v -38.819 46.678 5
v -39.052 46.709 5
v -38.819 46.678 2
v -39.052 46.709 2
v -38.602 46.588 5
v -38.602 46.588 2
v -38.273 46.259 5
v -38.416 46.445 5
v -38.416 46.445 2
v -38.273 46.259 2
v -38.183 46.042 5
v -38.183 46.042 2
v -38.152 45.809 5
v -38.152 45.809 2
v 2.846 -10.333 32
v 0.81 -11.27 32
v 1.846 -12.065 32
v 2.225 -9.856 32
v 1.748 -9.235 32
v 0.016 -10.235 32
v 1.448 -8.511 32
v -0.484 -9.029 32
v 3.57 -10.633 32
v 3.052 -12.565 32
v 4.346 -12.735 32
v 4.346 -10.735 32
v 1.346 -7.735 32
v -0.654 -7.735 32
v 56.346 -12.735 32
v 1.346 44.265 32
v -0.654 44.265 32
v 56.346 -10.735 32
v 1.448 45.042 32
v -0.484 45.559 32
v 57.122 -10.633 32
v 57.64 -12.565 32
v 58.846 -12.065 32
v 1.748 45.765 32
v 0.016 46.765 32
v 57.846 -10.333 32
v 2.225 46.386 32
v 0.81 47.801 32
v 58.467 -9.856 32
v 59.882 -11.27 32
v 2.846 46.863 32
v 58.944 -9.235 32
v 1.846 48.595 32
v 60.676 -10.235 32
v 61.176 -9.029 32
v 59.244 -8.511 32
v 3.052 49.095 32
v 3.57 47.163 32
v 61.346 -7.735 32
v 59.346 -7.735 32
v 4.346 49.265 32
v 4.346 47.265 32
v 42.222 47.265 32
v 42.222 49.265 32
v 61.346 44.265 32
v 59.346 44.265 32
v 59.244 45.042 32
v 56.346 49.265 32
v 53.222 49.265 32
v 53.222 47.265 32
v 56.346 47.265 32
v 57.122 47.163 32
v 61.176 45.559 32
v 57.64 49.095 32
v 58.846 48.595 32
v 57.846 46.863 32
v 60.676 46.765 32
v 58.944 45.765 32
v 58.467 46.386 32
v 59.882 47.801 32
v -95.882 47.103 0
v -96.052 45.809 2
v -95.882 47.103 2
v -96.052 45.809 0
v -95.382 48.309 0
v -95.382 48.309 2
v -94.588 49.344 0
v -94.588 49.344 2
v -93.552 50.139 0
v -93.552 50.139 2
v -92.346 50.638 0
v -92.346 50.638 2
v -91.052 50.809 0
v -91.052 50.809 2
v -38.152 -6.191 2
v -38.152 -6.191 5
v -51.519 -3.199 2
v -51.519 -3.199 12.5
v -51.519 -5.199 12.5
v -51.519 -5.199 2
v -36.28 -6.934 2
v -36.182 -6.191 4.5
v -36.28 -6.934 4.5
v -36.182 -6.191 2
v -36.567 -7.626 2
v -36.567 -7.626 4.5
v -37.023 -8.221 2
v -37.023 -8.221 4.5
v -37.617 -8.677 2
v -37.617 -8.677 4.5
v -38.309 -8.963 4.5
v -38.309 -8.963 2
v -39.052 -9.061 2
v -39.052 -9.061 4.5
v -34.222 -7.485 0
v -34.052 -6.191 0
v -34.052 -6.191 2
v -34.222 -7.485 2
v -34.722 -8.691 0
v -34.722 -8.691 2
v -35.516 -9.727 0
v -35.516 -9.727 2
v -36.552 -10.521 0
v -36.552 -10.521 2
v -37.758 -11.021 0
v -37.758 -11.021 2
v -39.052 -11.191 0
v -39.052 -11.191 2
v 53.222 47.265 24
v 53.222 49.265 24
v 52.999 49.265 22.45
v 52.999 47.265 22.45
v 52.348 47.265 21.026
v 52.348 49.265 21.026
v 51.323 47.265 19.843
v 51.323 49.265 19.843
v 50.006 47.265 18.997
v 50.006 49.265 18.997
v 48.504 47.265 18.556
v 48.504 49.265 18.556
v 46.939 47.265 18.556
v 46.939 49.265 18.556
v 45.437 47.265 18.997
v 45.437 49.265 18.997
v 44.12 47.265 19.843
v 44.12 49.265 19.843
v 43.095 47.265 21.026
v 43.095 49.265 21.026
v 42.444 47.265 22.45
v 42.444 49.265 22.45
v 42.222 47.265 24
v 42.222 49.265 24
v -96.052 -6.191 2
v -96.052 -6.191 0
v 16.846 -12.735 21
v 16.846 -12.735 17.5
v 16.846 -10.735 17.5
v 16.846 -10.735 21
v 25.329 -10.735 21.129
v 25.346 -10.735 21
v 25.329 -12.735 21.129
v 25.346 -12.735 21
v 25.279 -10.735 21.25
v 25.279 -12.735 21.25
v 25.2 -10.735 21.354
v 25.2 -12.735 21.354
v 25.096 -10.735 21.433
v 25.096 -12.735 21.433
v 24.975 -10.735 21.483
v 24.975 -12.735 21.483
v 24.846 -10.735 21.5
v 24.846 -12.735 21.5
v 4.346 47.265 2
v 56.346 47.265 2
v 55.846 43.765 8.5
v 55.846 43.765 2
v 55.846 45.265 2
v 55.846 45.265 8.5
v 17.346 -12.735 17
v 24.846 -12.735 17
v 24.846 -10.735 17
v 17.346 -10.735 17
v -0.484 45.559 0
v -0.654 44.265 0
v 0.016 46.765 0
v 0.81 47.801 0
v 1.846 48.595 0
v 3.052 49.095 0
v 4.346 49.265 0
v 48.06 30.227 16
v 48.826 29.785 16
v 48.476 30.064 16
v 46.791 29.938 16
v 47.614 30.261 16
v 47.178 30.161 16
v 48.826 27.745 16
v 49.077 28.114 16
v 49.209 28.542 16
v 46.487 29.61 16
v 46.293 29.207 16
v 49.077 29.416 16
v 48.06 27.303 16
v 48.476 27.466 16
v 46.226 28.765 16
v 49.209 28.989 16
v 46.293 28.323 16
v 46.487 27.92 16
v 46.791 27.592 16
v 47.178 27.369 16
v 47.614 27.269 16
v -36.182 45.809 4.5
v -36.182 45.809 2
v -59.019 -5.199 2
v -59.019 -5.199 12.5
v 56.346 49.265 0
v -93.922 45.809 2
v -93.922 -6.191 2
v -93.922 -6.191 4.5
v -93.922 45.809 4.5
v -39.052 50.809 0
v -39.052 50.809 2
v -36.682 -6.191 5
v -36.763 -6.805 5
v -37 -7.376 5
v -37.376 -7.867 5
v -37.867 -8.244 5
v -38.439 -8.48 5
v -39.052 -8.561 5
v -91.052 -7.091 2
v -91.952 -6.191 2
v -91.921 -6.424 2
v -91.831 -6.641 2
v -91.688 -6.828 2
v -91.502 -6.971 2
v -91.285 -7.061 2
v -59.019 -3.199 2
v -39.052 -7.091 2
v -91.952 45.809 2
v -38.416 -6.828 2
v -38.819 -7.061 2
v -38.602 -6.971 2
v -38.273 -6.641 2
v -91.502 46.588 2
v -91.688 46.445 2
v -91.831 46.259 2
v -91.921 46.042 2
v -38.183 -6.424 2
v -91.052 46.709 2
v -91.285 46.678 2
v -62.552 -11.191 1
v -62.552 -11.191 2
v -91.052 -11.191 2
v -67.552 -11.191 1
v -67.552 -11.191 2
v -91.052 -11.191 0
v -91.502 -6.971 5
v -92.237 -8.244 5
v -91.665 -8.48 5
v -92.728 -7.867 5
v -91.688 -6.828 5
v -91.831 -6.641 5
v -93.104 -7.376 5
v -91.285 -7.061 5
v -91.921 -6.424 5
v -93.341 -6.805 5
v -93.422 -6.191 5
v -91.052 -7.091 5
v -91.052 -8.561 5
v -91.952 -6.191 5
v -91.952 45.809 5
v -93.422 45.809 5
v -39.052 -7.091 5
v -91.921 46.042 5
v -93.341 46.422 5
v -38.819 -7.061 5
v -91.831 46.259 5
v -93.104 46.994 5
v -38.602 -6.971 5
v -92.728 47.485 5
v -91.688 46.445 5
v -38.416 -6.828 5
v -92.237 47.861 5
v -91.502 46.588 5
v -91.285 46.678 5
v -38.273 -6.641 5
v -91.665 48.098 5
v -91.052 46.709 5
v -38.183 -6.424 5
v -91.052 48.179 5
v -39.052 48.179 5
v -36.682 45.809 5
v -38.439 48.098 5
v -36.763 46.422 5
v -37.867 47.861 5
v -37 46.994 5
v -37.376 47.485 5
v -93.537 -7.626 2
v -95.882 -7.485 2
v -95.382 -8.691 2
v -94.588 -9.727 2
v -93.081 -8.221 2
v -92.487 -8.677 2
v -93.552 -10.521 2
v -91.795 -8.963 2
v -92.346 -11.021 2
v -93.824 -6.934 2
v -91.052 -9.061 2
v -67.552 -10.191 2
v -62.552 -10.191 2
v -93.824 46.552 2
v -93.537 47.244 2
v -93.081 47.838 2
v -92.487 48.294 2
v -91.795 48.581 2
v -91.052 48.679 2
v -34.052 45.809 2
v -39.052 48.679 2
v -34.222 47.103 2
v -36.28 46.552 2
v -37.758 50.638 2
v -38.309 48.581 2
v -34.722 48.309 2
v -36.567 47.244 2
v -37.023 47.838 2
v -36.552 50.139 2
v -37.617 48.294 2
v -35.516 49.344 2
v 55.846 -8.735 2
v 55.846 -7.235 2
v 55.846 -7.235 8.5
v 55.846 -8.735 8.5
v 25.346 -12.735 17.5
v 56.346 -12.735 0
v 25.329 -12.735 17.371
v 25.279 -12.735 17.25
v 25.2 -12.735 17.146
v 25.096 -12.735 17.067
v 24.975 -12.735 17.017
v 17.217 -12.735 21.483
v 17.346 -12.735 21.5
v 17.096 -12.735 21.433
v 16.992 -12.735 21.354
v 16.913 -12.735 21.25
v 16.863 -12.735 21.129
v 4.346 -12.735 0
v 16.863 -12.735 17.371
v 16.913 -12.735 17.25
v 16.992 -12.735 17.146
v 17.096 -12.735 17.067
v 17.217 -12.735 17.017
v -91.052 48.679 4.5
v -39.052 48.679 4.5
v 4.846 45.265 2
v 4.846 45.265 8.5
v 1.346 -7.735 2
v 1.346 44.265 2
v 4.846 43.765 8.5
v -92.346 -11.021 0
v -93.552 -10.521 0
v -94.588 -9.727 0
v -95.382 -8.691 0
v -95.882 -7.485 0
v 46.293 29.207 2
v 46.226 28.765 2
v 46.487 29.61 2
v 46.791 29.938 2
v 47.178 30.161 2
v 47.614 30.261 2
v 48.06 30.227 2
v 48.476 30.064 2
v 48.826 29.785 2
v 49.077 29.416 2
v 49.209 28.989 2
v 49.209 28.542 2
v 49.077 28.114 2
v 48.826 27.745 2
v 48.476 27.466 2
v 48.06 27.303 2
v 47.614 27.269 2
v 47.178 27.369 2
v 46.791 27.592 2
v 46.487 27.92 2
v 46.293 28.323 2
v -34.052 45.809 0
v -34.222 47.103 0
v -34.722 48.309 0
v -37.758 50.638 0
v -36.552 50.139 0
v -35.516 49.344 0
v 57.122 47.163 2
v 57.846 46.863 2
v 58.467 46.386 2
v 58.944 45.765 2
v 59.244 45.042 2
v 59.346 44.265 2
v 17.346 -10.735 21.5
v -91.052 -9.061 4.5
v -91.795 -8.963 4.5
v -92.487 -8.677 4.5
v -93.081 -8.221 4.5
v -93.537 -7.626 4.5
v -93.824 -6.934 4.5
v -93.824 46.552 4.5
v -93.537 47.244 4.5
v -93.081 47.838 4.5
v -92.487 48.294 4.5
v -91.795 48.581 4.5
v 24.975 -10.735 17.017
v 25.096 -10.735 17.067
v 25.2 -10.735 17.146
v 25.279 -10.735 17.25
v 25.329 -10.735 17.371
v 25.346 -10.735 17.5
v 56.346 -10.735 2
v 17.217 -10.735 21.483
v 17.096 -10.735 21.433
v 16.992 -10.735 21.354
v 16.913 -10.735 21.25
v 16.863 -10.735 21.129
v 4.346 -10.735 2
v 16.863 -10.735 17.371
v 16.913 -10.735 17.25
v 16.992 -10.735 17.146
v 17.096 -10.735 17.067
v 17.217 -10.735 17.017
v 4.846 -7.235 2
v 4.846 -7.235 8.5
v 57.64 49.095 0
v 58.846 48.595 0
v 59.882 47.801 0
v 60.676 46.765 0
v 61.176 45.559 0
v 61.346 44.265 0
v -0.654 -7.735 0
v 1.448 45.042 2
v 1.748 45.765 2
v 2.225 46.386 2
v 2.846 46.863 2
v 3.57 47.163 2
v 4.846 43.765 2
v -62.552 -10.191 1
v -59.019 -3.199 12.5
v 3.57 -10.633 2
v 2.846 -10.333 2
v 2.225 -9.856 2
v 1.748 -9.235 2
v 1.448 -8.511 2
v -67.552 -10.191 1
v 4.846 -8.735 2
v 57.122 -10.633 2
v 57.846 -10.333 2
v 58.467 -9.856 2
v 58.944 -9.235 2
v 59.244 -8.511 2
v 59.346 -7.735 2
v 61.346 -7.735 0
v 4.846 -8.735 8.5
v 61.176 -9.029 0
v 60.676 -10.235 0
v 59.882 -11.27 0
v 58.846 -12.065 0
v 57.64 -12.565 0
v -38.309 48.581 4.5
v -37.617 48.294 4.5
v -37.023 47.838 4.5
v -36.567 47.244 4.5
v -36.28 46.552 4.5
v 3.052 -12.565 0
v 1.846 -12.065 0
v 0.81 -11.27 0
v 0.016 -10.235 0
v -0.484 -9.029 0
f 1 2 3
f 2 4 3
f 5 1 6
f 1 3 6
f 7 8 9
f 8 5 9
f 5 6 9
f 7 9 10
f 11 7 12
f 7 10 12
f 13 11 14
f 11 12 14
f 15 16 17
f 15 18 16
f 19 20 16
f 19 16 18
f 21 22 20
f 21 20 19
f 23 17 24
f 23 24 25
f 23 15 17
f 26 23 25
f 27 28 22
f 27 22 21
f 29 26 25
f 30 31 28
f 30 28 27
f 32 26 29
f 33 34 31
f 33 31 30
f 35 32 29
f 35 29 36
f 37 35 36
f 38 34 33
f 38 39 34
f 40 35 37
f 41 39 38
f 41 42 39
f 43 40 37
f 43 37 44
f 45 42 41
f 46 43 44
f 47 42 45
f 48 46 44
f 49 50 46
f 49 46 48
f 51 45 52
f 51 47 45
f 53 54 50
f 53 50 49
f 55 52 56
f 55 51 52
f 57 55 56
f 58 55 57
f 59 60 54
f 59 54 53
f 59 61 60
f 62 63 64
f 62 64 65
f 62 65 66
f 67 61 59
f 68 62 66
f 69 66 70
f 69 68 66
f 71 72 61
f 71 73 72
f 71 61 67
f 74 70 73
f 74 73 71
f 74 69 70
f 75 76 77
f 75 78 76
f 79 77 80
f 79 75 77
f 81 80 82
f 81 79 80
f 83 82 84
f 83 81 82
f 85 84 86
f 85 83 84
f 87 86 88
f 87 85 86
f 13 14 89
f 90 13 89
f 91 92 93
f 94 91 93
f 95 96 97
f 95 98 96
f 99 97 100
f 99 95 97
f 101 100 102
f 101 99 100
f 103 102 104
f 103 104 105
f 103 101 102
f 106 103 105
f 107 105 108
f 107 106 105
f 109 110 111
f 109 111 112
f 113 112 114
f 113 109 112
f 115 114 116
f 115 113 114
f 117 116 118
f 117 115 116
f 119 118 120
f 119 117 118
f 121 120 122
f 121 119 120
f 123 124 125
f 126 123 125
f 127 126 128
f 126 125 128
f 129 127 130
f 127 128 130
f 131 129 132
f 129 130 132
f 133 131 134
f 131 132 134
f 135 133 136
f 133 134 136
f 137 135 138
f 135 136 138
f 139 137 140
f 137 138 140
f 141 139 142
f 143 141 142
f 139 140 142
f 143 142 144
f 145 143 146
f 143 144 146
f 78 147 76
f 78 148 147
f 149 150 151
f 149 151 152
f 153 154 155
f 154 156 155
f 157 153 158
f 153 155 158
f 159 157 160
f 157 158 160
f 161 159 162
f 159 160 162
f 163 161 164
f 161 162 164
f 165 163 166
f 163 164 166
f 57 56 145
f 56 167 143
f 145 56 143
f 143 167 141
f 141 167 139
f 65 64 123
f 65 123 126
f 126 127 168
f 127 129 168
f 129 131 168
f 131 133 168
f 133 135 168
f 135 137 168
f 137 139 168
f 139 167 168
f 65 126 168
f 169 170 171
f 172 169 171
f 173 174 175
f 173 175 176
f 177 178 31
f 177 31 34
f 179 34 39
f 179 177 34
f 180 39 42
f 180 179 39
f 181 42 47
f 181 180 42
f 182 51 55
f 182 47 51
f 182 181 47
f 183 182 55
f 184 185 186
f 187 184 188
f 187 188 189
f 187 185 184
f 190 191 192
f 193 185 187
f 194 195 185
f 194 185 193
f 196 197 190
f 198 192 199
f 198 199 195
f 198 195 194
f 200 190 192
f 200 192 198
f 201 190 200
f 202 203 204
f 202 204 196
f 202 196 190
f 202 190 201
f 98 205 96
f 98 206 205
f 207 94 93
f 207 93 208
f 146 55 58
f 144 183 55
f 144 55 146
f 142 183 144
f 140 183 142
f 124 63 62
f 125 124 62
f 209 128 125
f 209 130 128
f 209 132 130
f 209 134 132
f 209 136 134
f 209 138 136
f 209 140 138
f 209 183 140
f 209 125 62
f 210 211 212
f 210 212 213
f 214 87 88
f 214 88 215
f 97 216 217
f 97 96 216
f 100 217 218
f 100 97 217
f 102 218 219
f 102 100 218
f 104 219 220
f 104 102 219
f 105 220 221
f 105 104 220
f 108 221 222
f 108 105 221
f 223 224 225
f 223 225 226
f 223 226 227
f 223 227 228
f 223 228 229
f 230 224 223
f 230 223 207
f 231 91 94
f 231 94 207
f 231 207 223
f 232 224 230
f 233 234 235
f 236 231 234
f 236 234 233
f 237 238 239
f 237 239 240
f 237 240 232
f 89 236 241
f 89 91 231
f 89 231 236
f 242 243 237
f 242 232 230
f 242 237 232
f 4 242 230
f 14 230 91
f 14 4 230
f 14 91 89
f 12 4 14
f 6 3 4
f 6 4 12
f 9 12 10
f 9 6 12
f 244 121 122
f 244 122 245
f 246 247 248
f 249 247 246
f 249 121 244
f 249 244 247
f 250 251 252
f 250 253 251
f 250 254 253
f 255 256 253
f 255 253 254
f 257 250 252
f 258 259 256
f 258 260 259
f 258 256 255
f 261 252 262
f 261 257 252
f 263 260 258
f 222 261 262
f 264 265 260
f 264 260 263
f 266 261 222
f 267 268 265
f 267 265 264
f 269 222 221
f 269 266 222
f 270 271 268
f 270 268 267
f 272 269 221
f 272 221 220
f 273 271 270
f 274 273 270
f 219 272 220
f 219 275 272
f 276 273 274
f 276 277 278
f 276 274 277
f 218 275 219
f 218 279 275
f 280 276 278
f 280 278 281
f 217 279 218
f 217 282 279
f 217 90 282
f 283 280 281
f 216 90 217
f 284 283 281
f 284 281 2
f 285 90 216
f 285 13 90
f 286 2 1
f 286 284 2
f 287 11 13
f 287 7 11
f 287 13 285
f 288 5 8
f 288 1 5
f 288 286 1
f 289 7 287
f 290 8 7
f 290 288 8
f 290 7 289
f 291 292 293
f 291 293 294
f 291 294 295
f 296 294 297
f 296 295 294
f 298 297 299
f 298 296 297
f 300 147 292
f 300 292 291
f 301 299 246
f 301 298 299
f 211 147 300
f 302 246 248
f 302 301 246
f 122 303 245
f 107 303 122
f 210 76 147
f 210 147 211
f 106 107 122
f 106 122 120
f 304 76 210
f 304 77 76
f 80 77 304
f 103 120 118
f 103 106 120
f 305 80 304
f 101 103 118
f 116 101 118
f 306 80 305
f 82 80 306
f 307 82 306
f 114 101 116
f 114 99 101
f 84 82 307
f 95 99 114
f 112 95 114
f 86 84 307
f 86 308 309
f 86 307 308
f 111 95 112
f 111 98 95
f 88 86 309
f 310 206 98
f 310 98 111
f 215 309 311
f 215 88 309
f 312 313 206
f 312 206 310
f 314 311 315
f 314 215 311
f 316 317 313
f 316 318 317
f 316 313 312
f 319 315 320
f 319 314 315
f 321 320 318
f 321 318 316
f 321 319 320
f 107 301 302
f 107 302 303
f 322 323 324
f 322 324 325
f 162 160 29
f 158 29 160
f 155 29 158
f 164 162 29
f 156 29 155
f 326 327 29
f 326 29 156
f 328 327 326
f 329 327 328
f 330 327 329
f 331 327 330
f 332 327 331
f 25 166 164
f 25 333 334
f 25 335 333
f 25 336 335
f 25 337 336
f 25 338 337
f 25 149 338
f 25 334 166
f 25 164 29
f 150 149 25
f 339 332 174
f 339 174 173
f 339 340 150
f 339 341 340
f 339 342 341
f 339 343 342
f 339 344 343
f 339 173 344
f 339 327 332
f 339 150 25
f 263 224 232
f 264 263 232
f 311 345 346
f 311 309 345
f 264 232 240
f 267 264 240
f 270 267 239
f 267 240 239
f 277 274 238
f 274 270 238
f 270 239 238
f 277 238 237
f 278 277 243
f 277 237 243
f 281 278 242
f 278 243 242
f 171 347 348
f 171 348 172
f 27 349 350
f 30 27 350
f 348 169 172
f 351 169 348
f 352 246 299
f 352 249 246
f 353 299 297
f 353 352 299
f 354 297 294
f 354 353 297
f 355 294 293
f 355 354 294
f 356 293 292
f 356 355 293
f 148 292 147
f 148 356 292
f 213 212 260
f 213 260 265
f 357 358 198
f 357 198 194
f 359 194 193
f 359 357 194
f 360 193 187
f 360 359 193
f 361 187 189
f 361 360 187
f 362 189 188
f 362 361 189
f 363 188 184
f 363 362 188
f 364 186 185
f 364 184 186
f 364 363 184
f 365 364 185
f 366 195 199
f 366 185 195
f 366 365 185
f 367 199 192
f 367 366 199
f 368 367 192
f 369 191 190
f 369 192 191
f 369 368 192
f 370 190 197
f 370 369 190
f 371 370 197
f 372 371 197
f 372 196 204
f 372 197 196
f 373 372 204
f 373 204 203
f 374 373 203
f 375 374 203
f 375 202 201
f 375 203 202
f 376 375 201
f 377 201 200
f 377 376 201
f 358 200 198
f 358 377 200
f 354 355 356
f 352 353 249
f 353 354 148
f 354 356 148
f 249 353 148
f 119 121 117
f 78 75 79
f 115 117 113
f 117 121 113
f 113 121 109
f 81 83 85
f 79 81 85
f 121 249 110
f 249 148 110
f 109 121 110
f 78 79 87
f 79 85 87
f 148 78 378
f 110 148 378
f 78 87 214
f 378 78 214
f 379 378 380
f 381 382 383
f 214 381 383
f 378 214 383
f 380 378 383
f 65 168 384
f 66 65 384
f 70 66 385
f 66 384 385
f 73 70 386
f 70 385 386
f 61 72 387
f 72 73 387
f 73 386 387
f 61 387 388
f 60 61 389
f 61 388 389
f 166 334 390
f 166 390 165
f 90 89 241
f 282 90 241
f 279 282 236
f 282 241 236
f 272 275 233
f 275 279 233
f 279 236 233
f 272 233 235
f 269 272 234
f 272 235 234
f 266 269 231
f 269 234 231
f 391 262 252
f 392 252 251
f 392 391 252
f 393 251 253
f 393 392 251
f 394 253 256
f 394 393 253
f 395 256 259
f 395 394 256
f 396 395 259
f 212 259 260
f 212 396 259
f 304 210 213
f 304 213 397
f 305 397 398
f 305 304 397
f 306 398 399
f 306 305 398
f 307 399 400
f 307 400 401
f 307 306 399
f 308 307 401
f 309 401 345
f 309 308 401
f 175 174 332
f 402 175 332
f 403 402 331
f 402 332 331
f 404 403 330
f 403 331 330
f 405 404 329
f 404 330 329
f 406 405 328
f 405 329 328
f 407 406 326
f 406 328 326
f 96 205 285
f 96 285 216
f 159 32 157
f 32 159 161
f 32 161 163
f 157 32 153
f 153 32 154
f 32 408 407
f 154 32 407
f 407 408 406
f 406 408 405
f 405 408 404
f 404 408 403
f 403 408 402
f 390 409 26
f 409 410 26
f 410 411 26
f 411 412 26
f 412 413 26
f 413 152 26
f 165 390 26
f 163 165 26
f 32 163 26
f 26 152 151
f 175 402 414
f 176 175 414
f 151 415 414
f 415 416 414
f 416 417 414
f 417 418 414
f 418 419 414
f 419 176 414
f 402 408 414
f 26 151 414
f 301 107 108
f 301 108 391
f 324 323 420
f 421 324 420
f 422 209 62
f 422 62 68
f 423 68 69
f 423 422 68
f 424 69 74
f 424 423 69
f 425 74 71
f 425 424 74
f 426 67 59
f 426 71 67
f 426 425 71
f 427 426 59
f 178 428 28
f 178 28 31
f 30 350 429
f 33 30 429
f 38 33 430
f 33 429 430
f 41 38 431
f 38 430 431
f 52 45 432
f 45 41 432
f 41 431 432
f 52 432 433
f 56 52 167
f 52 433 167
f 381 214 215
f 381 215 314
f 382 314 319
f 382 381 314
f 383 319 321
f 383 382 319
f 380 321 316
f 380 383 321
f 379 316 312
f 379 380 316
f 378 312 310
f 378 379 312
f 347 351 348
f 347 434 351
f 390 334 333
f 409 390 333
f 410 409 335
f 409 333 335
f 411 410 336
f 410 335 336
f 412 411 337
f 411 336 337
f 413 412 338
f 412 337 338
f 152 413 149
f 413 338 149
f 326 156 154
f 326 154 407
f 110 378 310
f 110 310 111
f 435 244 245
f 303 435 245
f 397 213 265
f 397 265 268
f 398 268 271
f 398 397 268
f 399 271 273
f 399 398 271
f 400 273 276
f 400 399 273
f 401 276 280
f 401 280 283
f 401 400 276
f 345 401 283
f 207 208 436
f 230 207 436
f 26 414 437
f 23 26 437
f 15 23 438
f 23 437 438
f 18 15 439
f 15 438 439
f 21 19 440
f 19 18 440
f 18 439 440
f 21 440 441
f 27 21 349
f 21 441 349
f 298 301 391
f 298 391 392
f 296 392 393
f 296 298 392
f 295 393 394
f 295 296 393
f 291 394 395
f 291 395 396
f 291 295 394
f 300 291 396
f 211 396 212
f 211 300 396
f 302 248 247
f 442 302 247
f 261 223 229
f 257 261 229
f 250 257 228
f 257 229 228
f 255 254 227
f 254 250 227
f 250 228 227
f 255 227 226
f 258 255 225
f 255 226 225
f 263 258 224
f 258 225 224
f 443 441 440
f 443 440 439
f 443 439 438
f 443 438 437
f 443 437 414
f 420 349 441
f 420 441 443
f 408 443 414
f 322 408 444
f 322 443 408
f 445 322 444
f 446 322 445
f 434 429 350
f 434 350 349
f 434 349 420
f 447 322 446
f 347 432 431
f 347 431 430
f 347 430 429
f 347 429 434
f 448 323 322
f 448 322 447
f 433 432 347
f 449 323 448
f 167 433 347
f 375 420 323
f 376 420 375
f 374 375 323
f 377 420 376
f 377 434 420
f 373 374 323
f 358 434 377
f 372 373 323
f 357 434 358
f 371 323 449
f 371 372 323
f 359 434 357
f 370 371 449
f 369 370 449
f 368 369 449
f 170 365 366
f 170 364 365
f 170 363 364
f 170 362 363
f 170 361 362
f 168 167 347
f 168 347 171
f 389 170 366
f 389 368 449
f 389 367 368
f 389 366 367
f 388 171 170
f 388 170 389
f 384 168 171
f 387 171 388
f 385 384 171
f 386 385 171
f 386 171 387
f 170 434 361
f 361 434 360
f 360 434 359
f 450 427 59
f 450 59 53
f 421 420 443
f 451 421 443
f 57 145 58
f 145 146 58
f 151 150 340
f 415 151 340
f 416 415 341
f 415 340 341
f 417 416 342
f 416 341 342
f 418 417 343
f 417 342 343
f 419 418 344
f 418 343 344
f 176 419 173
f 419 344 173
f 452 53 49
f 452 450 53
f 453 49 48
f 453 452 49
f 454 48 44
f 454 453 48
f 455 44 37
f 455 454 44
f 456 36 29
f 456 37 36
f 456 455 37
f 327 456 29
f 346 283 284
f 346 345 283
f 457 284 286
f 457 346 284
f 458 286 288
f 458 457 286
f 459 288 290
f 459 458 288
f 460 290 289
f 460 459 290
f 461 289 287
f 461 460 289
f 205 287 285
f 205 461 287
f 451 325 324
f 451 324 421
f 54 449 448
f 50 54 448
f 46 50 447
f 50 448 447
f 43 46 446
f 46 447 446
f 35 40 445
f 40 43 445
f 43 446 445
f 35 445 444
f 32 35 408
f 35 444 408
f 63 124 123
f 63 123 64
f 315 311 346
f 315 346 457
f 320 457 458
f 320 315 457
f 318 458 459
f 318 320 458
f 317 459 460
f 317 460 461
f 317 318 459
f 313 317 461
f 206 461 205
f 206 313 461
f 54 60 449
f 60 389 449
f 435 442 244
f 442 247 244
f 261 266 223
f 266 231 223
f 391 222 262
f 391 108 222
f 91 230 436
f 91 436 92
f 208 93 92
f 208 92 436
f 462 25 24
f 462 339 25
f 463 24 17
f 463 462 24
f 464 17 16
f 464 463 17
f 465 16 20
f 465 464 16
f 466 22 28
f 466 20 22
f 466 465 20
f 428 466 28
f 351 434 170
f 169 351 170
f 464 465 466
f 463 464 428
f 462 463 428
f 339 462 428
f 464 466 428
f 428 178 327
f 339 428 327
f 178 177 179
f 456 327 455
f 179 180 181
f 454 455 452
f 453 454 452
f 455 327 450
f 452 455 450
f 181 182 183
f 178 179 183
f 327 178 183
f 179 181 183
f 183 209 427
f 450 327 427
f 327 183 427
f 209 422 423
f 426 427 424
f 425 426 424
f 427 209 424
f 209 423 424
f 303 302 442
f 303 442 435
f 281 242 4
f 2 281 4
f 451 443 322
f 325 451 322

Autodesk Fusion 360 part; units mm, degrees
sketch "Skizze1" plane through (0, 0, 0) normal (0, 0, 1) x (1, 0, 0)
  line L0 (4.346, 49.2651) -> (56.346, 49.2651)
  line L1 (61.346, 44.2651) -> (61.346, -7.7349)
  line L2 (56.346, -12.7349) -> (4.346, -12.7349)
  line L3 (-0.654, -7.7349) -> (-0.654, 44.2651)
  arc A0 (4.346, 49.2651) -> (-0.654, 44.2651) centre (4.346, 44.2651) ccw
  arc A1 (61.346, 44.2651) -> (56.346, 49.2651) centre (56.346, 44.2651) ccw
  arc A2 (56.346, -12.7349) -> (61.346, -7.7349) centre (56.346, -7.7349) ccw
  arc A3 (-0.654, -7.7349) -> (4.346, -12.7349) centre (4.346, -7.7349) ccw
  arc A4 (59.346, 44.2651) -> (56.346, 47.2651) centre (56.346, 44.2651) ccw
  line L4 (4.346, 47.2651) -> (56.346, 47.2651)
  arc A5 (4.346, 47.2651) -> (1.346, 44.2651) centre (4.346, 44.2651) ccw
  line L5 (1.346, -7.7349) -> (1.346, 44.2651)
  arc A6 (1.346, -7.7349) -> (4.346, -10.7349) centre (4.346, -7.7349) ccw
  line L6 (56.346, -10.7349) -> (4.346, -10.7349)
  arc A7 (56.346, -10.7349) -> (59.346, -7.7349) centre (56.346, -7.7349) ccw
  line L7 (59.346, 44.2651) -> (59.346, -7.7349)
  point P0 (-0.654, 49.2651)
  point P1 (61.346, 49.2651)
  point P2 (-0.654, -12.7349)
  dimension "d1" = 62
  dimension "d2" = 62
  dimension "d3" = 5
  dimension "d4" = 5
  dimension "d5" = 2
extrude "Extrusion1" add sketch "Skizze1" along normal blind 2 contours A4 L4 A5 L5 A6 L6 A7 L7 makes body 1
extrude "Extrusion2" add sketch "Skizze1" along normal blind 32 bodies 1
sketch "Skizze2" plane through (0, 0, 2) normal (0, 0, 1) x (-1, 0, 0)
  arc A0 (-4.346, -47.2651) -> (-1.346, -44.2651) centre (-4.346, -44.2651) ccw
  line L0 (-1.346, -44.2651) -> (-1.346, 7.7349)
  arc A1 (-1.346, 7.7349) -> (-4.346, 10.7349) centre (-4.346, 7.7349) ccw
  line L1 (-4.346, 10.7349) -> (-56.346, 10.7349)
  arc A2 (-56.346, 10.7349) -> (-59.346, 7.7349) centre (-56.346, 7.7349) ccw
  line L2 (-59.346, 7.7349) -> (-59.346, -44.2651)
  arc A3 (-59.346, -44.2651) -> (-56.346, -47.2651) centre (-56.346, -44.2651) ccw
  line L3 (-56.346, -47.2651) -> (-4.346, -47.2651)
  line L4 (-30.346, -44.2651) -> (-30.346, 7.7349) construction
  line L5 (-55.846, 7.2349) -> (-4.846, 7.2349)
  line L6 (-4.846, -43.7651) -> (-55.846, -43.7651)
  line L7 (-55.846, 7.2349) -> (-4.846, -43.7651) construction
  line L8 (-4.846, 7.2349) -> (-55.846, -43.7651) construction
  line L9 (-47.726, -43.7651) -> (-47.726, 7.2349) construction
  line L10 (-4.846, -28.7651) -> (-55.846, -28.7651) construction
  circle A4 centre (-47.726, -28.7651) radius 1.5
  line L11 (-13.846, 7.2349) -> (-13.846, -43.7651) construction
  line L12 (-22.846, 7.2349) -> (-22.846, -43.7651) construction
  line L13 (-55.846, -43.7651) -> (-55.846, -45.2651)
  line L14 (-4.846, -43.7651) -> (-4.846, -45.2651)
  line L15 (-4.846, -45.2651) -> (-55.846, -45.2651)
  line L16 (-4.846, 7.2349) -> (-4.846, 8.7349)
  line L17 (-55.846, 7.2349) -> (-55.846, 8.7349)
  line L18 (-4.846, 8.7349) -> (-55.846, 8.7349)
  point P0 (-30.346, -18.2651)
  dimension "d10" = -29
  dimension "d11" = 51
  dimension "d12" = 51
  dimension "d17" = 15
  dimension "d18" = 3
  dimension "d50" = 1.5
  dimension "d51" = 1.5
  dimension "d52" = 1.5
  dimension "d53" = 1.5
extrude "Extrusion4" add sketch "Skizze2" along normal blind 14 contours A4 bodies 1
sketch "Skizze4" plane through (0, 49.2651, 0) normal (0, 1, 0) x (-1, 0, 0)
  line L0 (-56.346, 0) -> (-4.346, 0)
  line L1 (-4.346, 0) -> (-4.346, 32)
  line L2 (-4.346, 32) -> (-56.346, 32)
  line L3 (-56.346, 32) -> (-56.346, 0)
  line L4 (-47.7215, 1.9893) -> (-47.7215, 32) construction
  line L5 (-56.346, 2) -> (-4.346, 2) construction
  line L6 (-56.346, 24) -> (-4.346, 24) construction
  circle A0 centre (-47.7215, 24) radius 5.5
  line L7 (-42.2215, 24) -> (-42.2215, 32)
  line L8 (-53.2215, 24) -> (-53.2215, 32)
  dimension "d21" = -2
  dimension "d22" = -24
  dimension "d23" = 11
extrude "Extrusion6" cut sketch "Skizze4" against normal blind 4 contours L2 A0 L7 L8 | A0 bodies 1
sketch "Skizze5" plane through (0, -12.7349, 0) normal (0, -1, 0) x (1, 0, 0)
  line L0 (4.346, 0) -> (56.346, 0)
  line L1 (56.346, 0) -> (56.346, 32)
  line L2 (56.346, 32) -> (4.346, 32)
  line L3 (4.346, 32) -> (4.346, 0)
  line L4 (56.346, 21.5) -> (4.346, 21.5) construction
  line L5 (56.346, 17) -> (4.346, 17) construction
  line L6 (16.846, 32) -> (16.846, 0) construction
  line L7 (25.346, 32) -> (25.346, 0) construction
  line L8 (17.346, 21.5) -> (24.846, 21.5)
  line L9 (25.346, 21) -> (25.346, 17.5)
  line L10 (24.846, 17) -> (17.346, 17)
  line L11 (16.846, 17.5) -> (16.846, 21)
  arc A0 (17.346, 21.5) -> (16.846, 21) centre (17.346, 21) ccw
  arc A1 (25.346, 21) -> (24.846, 21.5) centre (24.846, 21) ccw
  arc A2 (24.846, 17) -> (25.346, 17.5) centre (24.846, 17.5) ccw
  arc A3 (16.846, 17.5) -> (17.346, 17) centre (17.346, 17.5) ccw
  dimension "d58" = -10.5
  dimension "d59" = -15
  dimension "d60" = -12.5
  dimension "d61" = -21
  dimension "d62" = 0.5
sketch "Skizze6" plane through (0, 0, 0) normal (0, 0, 1) x (1, 0, 0)
  line L0 (-91.052, 50.8088) -> (-39.052, 50.8088)
  line L1 (-34.052, 45.8088) -> (-34.052, -6.1912)
  line L2 (-39.052, -11.1912) -> (-91.052, -11.1912)
  line L3 (-96.052, -6.1912) -> (-96.052, 45.8088)
  arc A0 (-91.052, 50.8088) -> (-96.052, 45.8088) centre (-91.052, 45.8088) ccw
  arc A1 (-34.052, 45.8088) -> (-39.052, 50.8088) centre (-39.052, 45.8088) ccw
  arc A2 (-39.052, -11.1912) -> (-34.052, -6.1912) centre (-39.052, -6.1912) ccw
  arc A3 (-96.052, -6.1912) -> (-91.052, -11.1912) centre (-91.052, -6.1912) ccw
  arc A4 (-91.052, 48.6788) -> (-93.922, 45.8088) centre (-91.052, 45.8088) ccw
  line L4 (-93.922, -6.1912) -> (-93.922, 45.8088)
  arc A5 (-93.922, -6.1912) -> (-91.052, -9.0612) centre (-91.052, -6.1912) ccw
  line L5 (-39.052, -9.0612) -> (-91.052, -9.0612)
  arc A6 (-39.052, -9.0612) -> (-36.182, -6.1912) centre (-39.052, -6.1912) ccw
  line L6 (-36.182, 45.8088) -> (-36.182, -6.1912)
  arc A7 (-36.182, 45.8088) -> (-39.052, 48.6788) centre (-39.052, 45.8088) ccw
  line L7 (-91.052, 48.6788) -> (-39.052, 48.6788)
  arc A8 (-91.052, 46.7088) -> (-91.952, 45.8088) centre (-91.052, 45.8088) ccw
  line L8 (-91.952, -6.1912) -> (-91.952, 45.8088)
  arc A9 (-91.952, -6.1912) -> (-91.052, -7.0912) centre (-91.052, -6.1912) ccw
  line L9 (-39.052, -7.0912) -> (-91.052, -7.0912)
  arc A10 (-39.052, -7.0912) -> (-38.152, -6.1912) centre (-39.052, -6.1912) ccw
  line L10 (-38.152, 45.8088) -> (-38.152, -6.1912)
  arc A11 (-38.152, 45.8088) -> (-39.052, 46.7088) centre (-39.052, 45.8088) ccw
  line L11 (-91.052, 46.7088) -> (-39.052, 46.7088)
  line L12 (-78.952, -5.1912) -> (-71.452, -5.1912)
  line L13 (-71.452, -5.1912) -> (-71.452, -3.1912)
  line L14 (-71.452, -3.1912) -> (-78.952, -3.1912)
  line L15 (-78.952, -3.1912) -> (-78.952, -5.1912)
  point P0 (-96.052, 50.8088)
  point P1 (-34.052, 50.8088)
  point P2 (-96.052, -11.1912)
  dimension "d35" = 62
  dimension "d36" = 62
  dimension "d37" = 5
  dimension "d38" = 2.13
  dimension "d39" = 4.1
  dimension "d67" = 7.5
  dimension "d68" = 2
extrude "Extrusion8" add sketch "Skizze6" along normal blind 5 separate body contours A4 L4 A5 L5 A6 L6 A7 L7 makes body 2
extrude "Extrusion9" add sketch "Skizze6" along normal blind 2 contours L0 L1 L2 L3 A0 A1 A2 A3 | A8 L8 A9 L9 A10 L10 A11 L11 | L12 L13 L14 L15 bodies 2
chamfer "Fase1" distance 0.5 angle 45 8 edges at (-93.922, 19.8088, 5) (-93.0814, -8.2206, 5) (-65.052, -9.0612, 5) (-37.0226, -8.2206, 5) (-36.182, 19.8088, 5) (-37.0226, 47.8382, 5) (-65.052, 48.6788, 5) (-93.0814, 47.8382, 5) on bodies 2
sketch "Skizze7" plane through (0, -11.1912, 0) normal (0, -1, 0) x (1, 0, 0)
  line L0 (-91.052, 0) -> (-39.052, 0)
  line L1 (-39.052, 0) -> (-39.052, 2)
  line L2 (-39.052, 2) -> (-91.052, 2)
  line L3 (-91.052, 2) -> (-91.052, 0)
  line L4 (-65.052, 2) -> (-65.052, 0) construction
  line L5 (-39.052, 1) -> (-91.052, 1) construction
  line L6 (-65.052, 1) -> (-62.552, 1)
  line L7 (-62.552, 1) -> (-62.552, 2)
  line L8 (-62.552, 2) -> (-67.552, 2)
  line L9 (-67.552, 2) -> (-67.552, 1)
  line L10 (-67.552, 1) -> (-65.052, 1)
  dimension "d45" = -1
  dimension "d46" = 2.5
  dimension "d47" = 5
extrude "Extrusion10" cut sketch "Skizze7" against normal blind 1 contours L2 L6 L7 L8 L9 L10 bodies 2
extrude "Extrusion11" add sketch "Skizze2" along normal blind 6.5 contours L6 L13 L14 L15 bodies 1
extrude "Extrusion12" add sketch "Skizze2" along normal blind 6.5 contours L5 L16 L17 L18 bodies 1
extrude "Extrusion13" cut sketch "Skizze5" against normal blind 6 contours L8 L9 L10 L11 A0 A1 A2 A3 bodies 1
sketch "Skizze8" plane through (0, 0, 2) normal (0, 0, 1) x (-1, 0, 0)
  arc A0 (91.952, 6.1912) -> (91.052, 7.0912) centre (91.052, 6.1912) ccw
  line L0 (91.052, 7.0912) -> (39.052, 7.0912)
  arc A1 (39.052, 7.0912) -> (38.152, 6.1912) centre (39.052, 6.1912) ccw
  line L1 (38.152, 6.1912) -> (38.152, -45.8088)
  arc A2 (38.152, -45.8088) -> (39.052, -46.7088) centre (39.052, -45.8088) ccw
  line L2 (39.052, -46.7088) -> (91.052, -46.7088)
  arc A3 (91.052, -46.7088) -> (91.952, -45.8088) centre (91.052, -45.8088) ccw
  line L3 (91.952, -45.8088) -> (91.952, 6.1912)
  line L4 (59.0191, 3.1992) -> (51.5191, 3.1992)
  line L5 (51.5191, 3.1992) -> (51.5191, 5.1992)
  line L6 (51.5191, 5.1992) -> (59.0191, 5.1992)
  line L7 (59.0191, 5.1992) -> (59.0191, 3.1992)
  dimension "d71" = 7.5
  dimension "d72" = 2
extrude "Extrusion15" add sketch "Skizze8" along normal blind 10.5 contours L4 L5 L6 L7 bodies 2
